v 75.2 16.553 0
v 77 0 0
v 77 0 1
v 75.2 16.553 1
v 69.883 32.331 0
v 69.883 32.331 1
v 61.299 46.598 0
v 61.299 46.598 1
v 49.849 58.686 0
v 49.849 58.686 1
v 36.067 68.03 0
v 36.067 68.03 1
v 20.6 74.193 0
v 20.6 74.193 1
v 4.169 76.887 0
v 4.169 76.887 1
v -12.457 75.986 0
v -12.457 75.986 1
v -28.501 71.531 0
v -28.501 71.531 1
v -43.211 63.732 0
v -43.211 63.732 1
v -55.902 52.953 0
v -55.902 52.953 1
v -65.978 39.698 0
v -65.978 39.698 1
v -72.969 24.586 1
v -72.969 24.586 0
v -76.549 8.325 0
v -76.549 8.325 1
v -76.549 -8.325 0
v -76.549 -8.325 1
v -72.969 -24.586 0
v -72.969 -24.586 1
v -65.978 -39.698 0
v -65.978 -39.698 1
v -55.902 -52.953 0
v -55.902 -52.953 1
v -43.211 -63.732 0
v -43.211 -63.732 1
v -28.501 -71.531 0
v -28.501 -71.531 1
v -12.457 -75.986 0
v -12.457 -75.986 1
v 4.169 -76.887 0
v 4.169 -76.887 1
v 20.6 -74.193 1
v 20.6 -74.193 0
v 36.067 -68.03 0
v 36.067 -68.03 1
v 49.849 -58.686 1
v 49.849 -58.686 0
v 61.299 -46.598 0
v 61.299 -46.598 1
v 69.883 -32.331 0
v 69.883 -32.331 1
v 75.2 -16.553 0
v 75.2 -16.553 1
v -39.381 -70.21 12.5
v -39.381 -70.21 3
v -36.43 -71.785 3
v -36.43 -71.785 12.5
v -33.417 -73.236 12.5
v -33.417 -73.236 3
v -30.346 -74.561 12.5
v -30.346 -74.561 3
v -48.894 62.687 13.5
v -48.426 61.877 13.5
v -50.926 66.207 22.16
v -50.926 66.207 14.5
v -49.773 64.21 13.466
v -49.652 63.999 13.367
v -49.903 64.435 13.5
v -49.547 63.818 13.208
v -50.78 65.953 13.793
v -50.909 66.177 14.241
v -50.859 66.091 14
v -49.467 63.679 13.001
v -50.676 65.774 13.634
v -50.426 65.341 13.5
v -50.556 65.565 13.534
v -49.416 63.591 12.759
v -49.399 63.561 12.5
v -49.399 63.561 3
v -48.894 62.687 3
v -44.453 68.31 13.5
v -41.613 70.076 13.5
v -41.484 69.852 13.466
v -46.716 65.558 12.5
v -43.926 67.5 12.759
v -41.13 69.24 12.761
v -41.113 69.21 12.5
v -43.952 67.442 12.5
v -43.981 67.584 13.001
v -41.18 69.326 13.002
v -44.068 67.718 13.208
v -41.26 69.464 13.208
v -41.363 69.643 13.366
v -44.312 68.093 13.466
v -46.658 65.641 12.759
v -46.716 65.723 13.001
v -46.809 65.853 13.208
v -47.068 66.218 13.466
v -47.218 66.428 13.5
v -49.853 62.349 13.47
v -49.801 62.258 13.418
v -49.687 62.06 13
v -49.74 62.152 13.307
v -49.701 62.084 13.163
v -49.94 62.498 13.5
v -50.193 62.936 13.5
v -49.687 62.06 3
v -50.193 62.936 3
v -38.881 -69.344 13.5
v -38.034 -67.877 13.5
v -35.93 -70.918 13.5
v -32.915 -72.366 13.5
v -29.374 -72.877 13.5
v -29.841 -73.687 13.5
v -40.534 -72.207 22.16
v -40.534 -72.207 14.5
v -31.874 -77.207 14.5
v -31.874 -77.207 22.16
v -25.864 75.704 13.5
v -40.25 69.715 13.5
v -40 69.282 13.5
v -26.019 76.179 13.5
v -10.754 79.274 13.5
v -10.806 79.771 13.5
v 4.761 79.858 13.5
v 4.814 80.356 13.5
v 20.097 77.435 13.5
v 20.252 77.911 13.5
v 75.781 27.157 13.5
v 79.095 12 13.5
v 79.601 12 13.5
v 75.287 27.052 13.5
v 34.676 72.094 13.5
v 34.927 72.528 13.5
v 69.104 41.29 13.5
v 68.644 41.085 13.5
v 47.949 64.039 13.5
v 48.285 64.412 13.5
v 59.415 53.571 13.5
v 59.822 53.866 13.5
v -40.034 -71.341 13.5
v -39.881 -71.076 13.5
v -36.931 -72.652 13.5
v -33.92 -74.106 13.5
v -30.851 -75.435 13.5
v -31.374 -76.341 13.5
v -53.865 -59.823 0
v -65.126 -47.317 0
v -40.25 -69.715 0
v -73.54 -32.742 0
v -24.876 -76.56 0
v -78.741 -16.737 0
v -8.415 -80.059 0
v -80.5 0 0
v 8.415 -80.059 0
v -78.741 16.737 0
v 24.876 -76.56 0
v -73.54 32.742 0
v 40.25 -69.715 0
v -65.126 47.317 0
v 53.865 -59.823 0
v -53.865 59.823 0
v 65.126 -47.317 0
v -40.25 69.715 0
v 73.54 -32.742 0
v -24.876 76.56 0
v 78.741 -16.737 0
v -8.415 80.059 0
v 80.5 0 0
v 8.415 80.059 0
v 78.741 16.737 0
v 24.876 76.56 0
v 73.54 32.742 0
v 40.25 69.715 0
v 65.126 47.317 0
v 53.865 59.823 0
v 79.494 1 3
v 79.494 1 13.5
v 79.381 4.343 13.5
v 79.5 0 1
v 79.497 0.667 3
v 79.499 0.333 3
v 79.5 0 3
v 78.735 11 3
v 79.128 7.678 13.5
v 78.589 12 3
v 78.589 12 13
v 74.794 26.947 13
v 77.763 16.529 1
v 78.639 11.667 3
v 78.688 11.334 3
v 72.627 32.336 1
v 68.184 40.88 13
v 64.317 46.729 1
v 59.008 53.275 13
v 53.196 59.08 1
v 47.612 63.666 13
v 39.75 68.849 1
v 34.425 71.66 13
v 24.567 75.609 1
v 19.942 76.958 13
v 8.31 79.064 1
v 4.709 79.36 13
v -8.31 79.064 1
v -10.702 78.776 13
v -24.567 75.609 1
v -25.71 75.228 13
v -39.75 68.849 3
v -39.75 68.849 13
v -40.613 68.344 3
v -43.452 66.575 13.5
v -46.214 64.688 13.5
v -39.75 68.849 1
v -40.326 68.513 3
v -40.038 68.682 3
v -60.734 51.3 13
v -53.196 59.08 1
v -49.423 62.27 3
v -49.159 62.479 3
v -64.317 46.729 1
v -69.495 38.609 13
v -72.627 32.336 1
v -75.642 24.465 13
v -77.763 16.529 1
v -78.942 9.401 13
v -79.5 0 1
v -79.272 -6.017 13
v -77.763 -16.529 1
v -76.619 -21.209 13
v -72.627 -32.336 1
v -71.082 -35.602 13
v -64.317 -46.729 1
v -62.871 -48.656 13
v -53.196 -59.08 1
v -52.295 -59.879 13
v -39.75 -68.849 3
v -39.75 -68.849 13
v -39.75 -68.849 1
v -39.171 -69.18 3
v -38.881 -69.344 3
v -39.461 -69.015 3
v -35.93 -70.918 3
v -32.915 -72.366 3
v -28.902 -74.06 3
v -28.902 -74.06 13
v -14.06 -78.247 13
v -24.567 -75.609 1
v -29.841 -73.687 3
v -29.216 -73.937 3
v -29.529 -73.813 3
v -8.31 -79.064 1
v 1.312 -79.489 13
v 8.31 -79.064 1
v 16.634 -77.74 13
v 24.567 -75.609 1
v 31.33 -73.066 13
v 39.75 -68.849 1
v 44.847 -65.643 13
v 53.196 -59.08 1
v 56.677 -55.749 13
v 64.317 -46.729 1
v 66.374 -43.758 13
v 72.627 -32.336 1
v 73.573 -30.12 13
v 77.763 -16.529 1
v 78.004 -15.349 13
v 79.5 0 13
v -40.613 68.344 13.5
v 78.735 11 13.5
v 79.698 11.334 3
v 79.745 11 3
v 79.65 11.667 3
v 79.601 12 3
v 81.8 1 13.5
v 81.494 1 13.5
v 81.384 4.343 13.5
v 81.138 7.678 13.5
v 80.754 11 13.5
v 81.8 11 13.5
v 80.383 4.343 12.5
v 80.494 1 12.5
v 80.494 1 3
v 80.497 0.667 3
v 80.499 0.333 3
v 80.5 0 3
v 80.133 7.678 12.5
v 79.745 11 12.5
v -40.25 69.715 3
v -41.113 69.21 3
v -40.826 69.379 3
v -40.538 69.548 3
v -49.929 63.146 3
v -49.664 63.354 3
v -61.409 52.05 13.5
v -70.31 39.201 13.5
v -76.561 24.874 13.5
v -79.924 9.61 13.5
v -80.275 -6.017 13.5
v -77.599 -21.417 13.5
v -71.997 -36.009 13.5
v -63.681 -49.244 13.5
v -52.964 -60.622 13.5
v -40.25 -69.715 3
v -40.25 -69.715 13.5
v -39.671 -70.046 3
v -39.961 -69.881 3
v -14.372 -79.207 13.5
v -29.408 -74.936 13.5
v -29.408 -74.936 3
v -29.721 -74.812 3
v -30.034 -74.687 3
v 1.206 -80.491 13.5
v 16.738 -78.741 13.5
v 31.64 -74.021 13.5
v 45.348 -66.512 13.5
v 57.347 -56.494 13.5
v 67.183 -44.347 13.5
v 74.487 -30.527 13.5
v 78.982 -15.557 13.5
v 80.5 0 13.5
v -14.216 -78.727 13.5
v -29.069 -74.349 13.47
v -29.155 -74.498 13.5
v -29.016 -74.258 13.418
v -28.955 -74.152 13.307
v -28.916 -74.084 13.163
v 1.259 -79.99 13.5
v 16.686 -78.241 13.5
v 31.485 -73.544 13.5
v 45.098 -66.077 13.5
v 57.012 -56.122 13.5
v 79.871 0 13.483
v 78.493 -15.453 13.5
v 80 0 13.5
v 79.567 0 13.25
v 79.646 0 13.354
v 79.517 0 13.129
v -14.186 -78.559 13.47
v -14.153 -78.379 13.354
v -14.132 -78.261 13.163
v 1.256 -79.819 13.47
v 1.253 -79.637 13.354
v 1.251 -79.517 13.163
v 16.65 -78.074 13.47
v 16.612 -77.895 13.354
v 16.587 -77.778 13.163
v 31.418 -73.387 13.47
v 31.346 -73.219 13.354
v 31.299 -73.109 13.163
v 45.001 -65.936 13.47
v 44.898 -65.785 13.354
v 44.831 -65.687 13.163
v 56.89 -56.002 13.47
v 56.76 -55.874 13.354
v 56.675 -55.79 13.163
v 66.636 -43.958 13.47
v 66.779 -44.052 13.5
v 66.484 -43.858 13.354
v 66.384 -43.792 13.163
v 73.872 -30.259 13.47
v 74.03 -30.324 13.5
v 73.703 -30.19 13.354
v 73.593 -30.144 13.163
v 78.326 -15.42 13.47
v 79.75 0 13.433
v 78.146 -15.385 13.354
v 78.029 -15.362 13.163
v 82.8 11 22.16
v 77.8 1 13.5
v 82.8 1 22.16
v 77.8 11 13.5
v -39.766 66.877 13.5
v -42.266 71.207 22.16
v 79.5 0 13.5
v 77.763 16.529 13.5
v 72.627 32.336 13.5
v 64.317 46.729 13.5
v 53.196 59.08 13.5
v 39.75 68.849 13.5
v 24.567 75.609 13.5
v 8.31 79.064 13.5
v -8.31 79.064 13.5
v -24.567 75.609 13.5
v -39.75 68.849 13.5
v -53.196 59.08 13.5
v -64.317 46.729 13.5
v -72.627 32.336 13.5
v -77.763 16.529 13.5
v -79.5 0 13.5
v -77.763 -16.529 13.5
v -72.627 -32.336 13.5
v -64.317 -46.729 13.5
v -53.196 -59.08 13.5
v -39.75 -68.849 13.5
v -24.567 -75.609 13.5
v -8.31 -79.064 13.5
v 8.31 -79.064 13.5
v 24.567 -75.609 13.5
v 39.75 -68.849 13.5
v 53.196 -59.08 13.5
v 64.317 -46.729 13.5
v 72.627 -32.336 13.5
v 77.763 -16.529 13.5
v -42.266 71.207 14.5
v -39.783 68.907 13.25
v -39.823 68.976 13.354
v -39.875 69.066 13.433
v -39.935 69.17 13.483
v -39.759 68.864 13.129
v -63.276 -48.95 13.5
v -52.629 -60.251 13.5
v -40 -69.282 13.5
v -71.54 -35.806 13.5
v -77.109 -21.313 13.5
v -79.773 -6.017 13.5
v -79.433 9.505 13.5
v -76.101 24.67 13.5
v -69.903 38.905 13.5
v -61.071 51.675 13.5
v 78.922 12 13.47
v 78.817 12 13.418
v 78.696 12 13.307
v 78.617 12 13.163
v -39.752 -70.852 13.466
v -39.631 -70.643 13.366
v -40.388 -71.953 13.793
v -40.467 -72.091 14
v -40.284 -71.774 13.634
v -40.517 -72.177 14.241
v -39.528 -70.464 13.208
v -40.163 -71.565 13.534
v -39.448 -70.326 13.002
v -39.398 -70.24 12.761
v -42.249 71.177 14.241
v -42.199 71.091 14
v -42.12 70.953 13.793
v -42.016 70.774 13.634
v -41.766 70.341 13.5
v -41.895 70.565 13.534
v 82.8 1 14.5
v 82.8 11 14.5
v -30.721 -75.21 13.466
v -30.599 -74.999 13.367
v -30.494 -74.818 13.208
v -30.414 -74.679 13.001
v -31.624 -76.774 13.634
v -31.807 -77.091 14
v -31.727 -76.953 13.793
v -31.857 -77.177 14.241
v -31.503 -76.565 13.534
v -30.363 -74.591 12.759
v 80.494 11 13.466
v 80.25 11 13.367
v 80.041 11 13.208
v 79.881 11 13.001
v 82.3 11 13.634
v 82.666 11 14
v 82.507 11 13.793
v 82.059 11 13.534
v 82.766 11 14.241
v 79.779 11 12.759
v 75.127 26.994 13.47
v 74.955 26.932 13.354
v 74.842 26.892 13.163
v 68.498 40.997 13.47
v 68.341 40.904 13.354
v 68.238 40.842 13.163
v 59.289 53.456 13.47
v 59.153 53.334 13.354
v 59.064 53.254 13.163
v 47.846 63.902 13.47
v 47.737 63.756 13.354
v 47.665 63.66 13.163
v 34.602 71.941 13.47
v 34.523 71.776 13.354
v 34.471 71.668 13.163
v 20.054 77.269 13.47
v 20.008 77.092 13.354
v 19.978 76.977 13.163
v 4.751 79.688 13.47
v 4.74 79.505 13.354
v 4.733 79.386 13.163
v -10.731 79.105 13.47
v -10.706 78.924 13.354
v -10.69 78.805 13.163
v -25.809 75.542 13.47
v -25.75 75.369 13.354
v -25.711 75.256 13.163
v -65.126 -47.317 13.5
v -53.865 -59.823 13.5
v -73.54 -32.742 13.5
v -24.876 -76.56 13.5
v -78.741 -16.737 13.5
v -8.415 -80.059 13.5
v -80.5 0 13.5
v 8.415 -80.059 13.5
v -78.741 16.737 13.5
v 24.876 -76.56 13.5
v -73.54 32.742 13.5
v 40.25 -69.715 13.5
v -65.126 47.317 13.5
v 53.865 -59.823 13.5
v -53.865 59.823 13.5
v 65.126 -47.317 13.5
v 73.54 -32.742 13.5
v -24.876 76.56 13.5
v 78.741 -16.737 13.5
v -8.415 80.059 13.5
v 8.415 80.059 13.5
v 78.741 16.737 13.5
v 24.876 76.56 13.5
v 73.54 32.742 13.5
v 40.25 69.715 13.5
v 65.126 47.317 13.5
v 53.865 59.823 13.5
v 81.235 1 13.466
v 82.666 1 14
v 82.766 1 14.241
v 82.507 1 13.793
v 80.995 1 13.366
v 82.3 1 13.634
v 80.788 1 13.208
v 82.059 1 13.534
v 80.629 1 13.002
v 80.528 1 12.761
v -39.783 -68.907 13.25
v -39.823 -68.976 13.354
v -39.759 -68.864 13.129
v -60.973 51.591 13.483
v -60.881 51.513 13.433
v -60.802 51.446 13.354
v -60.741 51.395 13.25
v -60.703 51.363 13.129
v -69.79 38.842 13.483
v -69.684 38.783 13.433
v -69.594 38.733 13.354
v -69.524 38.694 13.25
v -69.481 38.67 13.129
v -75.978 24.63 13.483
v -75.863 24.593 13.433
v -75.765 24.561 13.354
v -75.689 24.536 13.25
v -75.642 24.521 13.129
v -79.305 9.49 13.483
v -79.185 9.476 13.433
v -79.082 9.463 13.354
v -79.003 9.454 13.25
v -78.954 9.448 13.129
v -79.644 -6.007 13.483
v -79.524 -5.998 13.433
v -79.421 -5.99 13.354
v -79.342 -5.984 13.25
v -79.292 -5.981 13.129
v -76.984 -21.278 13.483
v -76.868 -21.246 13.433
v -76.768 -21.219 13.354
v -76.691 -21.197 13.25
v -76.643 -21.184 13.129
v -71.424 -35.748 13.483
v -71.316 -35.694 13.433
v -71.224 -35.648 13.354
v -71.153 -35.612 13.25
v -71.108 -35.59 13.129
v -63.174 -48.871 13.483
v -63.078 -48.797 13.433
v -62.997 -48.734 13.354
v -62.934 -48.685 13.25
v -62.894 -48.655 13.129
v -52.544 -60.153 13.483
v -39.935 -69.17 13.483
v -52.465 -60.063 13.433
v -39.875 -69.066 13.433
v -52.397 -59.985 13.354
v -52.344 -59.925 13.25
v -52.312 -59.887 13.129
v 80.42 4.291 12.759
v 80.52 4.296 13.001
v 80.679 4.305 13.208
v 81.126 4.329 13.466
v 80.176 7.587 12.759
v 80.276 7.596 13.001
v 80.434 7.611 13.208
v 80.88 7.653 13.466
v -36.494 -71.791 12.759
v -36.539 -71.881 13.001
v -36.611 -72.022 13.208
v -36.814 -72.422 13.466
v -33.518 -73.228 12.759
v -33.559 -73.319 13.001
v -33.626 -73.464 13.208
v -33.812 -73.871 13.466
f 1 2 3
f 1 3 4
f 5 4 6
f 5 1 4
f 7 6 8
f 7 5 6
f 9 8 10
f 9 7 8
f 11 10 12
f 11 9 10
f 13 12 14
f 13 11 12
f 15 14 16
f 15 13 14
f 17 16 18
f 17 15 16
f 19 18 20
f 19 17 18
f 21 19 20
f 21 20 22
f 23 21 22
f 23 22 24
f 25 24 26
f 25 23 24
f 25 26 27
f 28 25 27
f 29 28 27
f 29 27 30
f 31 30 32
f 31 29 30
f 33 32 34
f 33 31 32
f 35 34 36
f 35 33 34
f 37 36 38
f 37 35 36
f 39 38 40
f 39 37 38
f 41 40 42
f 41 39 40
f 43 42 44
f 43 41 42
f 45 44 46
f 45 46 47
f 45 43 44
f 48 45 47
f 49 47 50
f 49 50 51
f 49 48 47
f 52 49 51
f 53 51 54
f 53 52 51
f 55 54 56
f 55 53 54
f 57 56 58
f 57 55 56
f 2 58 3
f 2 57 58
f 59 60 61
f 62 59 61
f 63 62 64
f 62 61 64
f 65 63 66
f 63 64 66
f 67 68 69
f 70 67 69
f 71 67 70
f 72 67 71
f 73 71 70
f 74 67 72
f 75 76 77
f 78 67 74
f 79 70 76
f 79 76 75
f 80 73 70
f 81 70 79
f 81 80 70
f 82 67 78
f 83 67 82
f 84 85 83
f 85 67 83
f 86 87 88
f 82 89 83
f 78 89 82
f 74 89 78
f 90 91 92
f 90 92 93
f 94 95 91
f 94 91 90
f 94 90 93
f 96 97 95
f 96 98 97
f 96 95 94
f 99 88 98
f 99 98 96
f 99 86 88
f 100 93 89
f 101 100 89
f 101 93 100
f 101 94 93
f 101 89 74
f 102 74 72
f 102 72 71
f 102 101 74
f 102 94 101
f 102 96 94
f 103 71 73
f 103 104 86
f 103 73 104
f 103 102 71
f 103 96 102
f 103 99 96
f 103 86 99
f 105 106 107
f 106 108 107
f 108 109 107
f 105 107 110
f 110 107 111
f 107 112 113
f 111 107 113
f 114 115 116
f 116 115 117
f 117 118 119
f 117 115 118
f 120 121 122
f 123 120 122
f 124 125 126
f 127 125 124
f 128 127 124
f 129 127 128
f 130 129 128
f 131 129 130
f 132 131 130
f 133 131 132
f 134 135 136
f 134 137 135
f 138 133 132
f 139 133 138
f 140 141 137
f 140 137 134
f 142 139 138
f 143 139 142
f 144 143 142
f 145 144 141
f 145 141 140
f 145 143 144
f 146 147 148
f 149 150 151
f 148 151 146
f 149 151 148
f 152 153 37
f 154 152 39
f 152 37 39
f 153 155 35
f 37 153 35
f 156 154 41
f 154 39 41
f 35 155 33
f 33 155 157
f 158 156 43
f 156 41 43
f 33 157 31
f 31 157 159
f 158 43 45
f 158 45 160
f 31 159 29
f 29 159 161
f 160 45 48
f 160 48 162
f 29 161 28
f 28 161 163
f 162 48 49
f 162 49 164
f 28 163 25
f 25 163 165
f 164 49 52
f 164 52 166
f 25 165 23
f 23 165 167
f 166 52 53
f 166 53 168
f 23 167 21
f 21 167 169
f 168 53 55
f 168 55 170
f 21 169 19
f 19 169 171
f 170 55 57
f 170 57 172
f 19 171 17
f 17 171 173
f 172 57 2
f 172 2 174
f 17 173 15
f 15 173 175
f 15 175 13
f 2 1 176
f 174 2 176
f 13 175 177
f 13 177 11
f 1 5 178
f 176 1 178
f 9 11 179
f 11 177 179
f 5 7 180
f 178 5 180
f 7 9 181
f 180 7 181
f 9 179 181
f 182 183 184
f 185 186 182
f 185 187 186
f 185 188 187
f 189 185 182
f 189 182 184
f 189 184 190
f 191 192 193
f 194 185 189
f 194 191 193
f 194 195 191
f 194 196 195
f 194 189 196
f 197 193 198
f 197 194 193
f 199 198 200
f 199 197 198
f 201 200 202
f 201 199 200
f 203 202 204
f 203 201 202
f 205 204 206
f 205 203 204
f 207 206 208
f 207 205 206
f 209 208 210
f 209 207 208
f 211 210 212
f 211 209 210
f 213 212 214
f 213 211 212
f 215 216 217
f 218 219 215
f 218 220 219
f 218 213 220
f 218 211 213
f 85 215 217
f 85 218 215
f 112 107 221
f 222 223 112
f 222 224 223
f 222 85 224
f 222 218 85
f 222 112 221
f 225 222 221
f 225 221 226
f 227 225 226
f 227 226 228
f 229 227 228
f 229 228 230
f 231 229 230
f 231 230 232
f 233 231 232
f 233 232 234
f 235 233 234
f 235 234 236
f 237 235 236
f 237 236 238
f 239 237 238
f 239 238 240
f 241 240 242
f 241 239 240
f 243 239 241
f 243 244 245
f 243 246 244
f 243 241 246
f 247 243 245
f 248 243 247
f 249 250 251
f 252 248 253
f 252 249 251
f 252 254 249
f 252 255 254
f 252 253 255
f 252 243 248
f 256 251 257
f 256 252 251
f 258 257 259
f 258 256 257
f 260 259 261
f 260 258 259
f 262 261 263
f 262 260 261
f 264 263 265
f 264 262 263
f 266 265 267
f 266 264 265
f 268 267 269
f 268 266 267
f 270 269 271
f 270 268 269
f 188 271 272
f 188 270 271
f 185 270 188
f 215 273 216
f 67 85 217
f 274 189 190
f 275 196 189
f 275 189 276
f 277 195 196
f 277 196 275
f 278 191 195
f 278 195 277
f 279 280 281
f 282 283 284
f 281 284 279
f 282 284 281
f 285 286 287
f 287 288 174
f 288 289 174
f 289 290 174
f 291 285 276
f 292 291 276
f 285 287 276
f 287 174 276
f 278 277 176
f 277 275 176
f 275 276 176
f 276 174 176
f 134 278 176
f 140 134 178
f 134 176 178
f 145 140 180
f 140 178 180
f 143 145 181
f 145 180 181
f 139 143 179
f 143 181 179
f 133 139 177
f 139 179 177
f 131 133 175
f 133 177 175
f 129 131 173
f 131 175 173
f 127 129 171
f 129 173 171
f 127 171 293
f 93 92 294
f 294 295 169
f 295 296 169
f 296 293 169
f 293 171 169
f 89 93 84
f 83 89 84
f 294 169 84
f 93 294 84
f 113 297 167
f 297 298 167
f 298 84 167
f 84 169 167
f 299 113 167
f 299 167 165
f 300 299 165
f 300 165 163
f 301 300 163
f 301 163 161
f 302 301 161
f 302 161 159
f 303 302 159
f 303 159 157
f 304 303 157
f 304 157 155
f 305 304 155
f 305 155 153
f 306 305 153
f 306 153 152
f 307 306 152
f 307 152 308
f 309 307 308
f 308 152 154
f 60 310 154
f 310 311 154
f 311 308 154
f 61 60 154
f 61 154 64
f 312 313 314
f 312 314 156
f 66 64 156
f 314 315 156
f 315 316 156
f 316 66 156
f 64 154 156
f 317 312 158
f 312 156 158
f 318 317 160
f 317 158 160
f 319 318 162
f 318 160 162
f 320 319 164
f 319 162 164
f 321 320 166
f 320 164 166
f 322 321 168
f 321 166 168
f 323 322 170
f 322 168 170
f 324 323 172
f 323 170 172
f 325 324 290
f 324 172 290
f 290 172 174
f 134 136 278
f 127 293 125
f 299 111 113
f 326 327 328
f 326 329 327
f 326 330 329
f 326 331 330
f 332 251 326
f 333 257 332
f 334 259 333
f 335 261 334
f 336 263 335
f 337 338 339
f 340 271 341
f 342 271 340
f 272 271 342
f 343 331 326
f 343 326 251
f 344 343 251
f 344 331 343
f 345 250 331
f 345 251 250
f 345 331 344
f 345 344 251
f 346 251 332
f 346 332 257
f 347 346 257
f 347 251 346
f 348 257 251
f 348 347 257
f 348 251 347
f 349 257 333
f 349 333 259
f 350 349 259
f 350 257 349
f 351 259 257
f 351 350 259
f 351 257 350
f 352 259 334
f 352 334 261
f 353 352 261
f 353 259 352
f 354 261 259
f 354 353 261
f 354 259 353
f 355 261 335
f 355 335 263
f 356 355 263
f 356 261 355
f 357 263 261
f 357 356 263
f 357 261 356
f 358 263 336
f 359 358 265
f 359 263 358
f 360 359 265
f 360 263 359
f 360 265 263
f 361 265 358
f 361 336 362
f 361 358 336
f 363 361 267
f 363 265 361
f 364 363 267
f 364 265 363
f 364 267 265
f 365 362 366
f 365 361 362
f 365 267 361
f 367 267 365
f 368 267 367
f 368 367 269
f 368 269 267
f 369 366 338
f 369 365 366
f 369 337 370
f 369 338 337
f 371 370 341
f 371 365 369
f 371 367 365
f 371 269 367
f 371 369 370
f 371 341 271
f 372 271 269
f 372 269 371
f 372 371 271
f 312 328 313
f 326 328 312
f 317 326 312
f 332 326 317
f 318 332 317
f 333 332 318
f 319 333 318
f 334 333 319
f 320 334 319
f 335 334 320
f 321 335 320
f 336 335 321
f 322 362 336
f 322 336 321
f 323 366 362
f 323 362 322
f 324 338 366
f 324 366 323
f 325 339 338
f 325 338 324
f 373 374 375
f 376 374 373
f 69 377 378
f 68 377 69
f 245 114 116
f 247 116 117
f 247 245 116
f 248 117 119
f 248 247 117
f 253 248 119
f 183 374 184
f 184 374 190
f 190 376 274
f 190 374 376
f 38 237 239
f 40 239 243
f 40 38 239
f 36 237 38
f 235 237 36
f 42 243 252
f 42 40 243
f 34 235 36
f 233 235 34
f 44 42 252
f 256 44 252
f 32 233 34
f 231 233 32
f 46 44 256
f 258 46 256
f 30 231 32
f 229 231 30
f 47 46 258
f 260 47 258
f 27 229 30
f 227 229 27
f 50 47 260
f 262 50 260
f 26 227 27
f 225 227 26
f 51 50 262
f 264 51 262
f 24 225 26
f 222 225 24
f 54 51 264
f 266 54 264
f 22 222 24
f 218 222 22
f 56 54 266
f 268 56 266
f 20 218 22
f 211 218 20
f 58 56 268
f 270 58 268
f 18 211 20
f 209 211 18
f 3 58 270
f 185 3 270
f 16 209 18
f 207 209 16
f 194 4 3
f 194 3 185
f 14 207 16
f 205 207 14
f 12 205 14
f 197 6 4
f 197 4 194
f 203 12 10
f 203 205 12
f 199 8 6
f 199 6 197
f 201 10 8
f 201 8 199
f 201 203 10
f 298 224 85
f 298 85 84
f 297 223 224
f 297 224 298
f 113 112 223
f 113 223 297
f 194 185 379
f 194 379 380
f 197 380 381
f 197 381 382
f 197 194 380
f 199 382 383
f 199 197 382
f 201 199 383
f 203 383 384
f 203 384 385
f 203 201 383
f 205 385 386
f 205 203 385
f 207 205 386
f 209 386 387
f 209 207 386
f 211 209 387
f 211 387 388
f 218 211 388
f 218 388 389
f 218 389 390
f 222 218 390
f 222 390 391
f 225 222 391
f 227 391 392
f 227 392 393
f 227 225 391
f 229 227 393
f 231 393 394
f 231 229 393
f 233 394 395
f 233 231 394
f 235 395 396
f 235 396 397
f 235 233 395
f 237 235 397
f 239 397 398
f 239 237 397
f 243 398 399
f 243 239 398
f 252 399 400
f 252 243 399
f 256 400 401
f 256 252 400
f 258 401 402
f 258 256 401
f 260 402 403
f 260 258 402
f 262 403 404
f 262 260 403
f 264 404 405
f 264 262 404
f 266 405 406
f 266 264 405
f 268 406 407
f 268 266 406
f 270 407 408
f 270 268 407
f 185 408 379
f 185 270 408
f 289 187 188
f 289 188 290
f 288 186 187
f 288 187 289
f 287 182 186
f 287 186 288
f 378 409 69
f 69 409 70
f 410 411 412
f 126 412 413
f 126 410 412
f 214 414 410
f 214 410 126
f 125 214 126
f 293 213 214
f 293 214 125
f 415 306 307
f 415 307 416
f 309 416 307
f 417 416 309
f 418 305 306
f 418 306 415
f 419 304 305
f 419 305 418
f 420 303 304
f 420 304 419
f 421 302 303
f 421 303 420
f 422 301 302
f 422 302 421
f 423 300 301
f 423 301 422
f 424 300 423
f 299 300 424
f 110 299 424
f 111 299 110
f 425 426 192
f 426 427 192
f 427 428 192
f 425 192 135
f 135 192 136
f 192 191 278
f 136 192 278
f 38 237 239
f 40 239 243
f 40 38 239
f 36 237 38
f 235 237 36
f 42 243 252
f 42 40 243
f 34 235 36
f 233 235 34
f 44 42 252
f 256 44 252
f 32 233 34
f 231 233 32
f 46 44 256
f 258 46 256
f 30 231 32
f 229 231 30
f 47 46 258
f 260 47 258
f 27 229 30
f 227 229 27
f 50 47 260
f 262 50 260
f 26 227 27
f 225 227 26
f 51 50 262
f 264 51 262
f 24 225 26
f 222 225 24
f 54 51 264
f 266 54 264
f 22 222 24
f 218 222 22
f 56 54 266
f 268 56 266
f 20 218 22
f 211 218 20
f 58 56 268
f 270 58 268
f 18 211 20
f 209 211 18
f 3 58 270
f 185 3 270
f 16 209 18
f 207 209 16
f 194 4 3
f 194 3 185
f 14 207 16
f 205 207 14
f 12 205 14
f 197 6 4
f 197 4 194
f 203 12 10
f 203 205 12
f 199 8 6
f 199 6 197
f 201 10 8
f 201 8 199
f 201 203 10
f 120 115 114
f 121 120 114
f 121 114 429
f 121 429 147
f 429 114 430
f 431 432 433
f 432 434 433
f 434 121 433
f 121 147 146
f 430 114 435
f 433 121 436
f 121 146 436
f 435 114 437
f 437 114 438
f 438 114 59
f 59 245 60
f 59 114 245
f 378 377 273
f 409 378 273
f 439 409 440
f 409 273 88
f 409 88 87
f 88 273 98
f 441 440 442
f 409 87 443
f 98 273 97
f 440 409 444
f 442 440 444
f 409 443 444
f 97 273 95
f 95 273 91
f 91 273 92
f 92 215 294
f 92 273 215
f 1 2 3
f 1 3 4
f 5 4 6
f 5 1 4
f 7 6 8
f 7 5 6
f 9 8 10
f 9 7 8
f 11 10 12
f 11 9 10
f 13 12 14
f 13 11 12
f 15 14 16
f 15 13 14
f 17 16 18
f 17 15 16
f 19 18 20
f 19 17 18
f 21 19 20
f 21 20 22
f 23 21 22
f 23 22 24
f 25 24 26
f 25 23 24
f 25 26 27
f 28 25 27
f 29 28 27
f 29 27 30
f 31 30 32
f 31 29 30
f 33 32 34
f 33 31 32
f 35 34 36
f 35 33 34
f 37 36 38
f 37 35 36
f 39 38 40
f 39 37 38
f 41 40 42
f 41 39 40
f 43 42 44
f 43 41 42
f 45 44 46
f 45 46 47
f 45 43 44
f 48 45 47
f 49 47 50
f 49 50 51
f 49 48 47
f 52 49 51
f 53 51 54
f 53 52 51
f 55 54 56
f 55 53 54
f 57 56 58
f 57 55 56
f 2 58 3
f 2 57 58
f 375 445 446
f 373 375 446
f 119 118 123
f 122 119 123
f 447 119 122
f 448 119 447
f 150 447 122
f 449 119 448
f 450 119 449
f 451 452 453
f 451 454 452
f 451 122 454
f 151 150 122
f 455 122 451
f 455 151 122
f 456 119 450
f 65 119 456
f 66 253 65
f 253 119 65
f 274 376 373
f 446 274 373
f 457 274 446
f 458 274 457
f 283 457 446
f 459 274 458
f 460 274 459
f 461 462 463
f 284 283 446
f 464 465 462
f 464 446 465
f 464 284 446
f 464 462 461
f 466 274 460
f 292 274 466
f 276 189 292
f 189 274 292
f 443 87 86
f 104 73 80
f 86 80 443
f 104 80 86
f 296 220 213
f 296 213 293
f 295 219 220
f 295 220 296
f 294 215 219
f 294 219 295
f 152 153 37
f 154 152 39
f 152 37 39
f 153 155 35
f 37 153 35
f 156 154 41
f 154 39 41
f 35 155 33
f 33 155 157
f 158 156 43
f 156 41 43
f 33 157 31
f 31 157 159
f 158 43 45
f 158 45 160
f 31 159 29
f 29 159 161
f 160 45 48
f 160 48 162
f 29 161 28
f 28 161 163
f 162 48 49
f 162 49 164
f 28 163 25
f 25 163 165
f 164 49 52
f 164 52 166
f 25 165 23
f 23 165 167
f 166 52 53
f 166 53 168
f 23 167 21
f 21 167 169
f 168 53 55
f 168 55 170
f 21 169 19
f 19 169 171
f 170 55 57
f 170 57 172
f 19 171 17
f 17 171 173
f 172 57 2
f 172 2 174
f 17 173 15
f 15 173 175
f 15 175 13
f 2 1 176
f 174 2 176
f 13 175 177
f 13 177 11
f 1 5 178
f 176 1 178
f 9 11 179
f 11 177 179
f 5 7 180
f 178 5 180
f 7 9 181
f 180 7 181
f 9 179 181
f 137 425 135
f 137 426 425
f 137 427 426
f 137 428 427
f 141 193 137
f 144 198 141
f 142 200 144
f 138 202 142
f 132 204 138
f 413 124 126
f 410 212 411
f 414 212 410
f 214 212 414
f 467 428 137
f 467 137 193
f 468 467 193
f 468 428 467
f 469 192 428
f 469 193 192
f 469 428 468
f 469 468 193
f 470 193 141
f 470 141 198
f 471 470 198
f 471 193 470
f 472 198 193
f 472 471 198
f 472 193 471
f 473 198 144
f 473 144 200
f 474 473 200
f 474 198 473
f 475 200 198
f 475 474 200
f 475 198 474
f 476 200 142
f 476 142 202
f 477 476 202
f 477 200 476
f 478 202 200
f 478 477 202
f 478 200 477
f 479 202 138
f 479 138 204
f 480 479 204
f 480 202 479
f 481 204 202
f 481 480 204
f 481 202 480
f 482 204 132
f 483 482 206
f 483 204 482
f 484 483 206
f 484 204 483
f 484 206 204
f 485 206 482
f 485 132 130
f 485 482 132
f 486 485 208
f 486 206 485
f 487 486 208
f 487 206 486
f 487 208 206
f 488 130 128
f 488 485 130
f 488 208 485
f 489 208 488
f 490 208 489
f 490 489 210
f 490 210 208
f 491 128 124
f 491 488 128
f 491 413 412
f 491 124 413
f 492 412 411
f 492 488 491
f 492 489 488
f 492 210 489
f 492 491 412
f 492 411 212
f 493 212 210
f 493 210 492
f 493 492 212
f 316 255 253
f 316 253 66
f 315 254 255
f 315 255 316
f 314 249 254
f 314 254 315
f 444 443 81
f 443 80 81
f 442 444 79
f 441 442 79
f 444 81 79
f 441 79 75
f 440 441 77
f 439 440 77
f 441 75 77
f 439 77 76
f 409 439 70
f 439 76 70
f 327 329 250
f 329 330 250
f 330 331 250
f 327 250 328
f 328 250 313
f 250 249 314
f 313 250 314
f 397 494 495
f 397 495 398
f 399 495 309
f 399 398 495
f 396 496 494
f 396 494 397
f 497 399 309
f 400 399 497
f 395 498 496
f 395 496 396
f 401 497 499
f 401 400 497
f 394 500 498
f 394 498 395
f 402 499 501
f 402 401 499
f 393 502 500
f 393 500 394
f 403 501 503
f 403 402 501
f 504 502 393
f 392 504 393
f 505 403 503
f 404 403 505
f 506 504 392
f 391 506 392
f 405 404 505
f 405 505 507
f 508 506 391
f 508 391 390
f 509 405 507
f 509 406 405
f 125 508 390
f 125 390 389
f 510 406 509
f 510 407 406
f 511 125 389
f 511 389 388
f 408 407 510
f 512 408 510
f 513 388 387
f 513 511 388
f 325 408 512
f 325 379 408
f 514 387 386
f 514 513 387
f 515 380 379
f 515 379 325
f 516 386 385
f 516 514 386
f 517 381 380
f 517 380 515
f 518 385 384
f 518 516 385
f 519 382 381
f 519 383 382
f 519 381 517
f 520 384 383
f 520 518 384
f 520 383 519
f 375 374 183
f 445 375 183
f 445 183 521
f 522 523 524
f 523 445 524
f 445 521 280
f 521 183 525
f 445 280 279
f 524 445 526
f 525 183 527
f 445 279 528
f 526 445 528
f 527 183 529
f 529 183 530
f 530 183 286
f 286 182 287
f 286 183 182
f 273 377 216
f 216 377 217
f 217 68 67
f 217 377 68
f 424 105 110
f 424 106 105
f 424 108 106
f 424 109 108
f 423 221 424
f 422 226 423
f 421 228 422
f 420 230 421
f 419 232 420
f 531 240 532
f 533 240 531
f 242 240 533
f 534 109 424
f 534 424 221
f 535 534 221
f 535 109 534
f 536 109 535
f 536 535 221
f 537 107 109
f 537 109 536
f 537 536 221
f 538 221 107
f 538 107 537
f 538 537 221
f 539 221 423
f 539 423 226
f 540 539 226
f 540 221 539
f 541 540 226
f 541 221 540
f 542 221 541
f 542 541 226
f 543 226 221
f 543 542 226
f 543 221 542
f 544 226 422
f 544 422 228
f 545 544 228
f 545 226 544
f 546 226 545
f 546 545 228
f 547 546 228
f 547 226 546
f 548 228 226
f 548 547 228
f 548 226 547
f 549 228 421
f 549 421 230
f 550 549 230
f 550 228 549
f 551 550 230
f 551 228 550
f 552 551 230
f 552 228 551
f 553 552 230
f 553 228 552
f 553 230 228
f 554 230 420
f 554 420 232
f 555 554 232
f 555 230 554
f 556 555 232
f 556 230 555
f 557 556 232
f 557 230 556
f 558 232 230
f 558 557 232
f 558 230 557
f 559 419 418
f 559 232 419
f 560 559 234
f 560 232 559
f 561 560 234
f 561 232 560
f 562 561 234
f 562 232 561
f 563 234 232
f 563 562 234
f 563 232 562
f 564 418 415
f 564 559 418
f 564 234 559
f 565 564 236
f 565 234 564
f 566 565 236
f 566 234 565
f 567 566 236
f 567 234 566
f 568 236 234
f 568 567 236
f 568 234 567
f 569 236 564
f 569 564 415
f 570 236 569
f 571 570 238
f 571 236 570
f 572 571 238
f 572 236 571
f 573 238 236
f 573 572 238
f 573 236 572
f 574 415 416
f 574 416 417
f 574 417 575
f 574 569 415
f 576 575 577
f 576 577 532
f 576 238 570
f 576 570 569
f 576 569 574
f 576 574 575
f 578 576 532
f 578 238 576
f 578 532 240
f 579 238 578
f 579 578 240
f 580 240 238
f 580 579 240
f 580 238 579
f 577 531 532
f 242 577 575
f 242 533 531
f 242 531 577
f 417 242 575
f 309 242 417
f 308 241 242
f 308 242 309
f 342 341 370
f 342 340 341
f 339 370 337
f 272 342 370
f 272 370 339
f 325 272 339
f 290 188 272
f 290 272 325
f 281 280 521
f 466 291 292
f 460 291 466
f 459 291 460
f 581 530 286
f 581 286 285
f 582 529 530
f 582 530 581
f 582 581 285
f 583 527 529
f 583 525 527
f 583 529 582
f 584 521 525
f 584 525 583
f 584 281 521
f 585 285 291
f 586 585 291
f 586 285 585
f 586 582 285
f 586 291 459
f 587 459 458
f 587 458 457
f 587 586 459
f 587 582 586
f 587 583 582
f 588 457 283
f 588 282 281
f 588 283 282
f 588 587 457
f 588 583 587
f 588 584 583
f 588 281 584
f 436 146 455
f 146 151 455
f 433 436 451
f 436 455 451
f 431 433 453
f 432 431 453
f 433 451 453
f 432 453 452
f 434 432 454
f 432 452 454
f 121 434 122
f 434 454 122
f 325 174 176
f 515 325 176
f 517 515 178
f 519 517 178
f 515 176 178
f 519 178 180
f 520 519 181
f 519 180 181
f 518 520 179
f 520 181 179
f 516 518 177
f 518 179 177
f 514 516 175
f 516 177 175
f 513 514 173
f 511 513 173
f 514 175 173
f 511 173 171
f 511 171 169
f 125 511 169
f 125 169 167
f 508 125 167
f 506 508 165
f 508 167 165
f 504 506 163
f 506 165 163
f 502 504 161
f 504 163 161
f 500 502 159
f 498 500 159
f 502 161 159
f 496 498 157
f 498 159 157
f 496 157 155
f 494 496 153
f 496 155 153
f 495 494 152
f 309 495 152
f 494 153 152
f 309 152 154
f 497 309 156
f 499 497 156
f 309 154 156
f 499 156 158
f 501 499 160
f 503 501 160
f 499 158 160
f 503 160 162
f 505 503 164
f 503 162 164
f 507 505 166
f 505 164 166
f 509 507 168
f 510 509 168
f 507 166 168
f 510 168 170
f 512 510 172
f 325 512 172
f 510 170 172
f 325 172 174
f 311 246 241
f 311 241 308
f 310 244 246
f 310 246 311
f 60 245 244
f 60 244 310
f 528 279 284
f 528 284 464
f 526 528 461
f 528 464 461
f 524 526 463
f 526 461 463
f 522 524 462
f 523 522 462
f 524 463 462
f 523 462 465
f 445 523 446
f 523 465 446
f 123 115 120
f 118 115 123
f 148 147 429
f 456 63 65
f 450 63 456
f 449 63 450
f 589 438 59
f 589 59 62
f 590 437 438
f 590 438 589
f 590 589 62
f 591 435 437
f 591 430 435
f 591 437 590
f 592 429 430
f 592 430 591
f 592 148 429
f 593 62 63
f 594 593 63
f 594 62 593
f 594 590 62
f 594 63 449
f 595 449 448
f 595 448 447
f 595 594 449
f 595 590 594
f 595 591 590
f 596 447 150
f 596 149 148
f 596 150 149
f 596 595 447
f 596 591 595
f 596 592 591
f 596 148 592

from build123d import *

# Parameters (mm, degrees)
CYLINDER_R             = 77
CYLINDER_DEPTH         = 1
CYLINDER001_R          = 79.5
CYLINDER001_DEPTH      = 12.5
CYLINDER002_R          = 80.5
CYLINDER002_DEPTH      = 13.5
BOX002_W               = 5
BOX002_H               = 10
BOX002_DEPTH           = 12
BOX003_W               = 5
BOX003_H               = 10
BOX003_DEPTH           = 12
BOX003_PLACEMENT_ANGLE = 30
CYLINDER003_R          = 79.5
CYLINDER003_DEPTH      = 13.5
CYLINDER004_R          = 80.5
CYLINDER004_DEPTH      = 13.5
BOX001_W               = 5
BOX001_H               = 10
BOX001_DEPTH           = 12
ARRAY001_COUNT         = 3
BOX_W                  = 5
BOX_H                  = 12
BOX_DEPTH              = 12
ARRAY_COUNT            = 3
CYLINDER005_R          = 77
CYLINDER005_DEPTH      = 1
CYLINDER006_R          = 79.5
CYLINDER006_DEPTH      = 12.5
CYLINDER007_R          = 80.5
CYLINDER007_DEPTH      = 13.5
FILLET_R               = 0.5
FILLET001_R            = 1


with BuildPart() as cylinder:
    # Cylinder → Cylinder (new body)
    with BuildSketch(Plane.XY):
        Circle(CYLINDER_R)
    extrude(amount=CYLINDER_DEPTH)


with BuildPart() as fusion:
    # Cylinder001 → Cylinder001 (new body)
    with BuildSketch(Plane.XY.offset(1)):
        Circle(CYLINDER001_R)
    extrude(amount=CYLINDER001_DEPTH)

    # Fusion: union Cylinder
    add(cylinder.part)


with BuildPart() as attachmentseatrecess_noclamps:
    # Cylinder002 → Cylinder002 (new body)
    with BuildSketch(Plane.XY):
        Circle(CYLINDER002_R)
    extrude(amount=CYLINDER002_DEPTH)

    # Cut: cut Fusion
    add(fusion.part, mode=Mode.SUBTRACT)


with BuildPart() as cube002:
    # Box002 → Box002 (new body)
    with BuildSketch(Plane(origin=(77.8, 1, 13.5), x_dir=(1, 0, 0), z_dir=(0, 0, 1))):
        with Locations((2.5, 5)):
            Rectangle(BOX002_W, BOX002_H)
    extrude(amount=BOX002_DEPTH)


with BuildPart() as common001:
    # Box003 → Box003 (new body)
    with BuildSketch(Plane.XY):
        with Locations((2.5, 5)):
            Rectangle(BOX003_W, BOX003_H)
    extrude(amount=BOX003_DEPTH)


with BuildPart() as common001_1:
    # Box003 placement: moved
    add(common001.part.moved(Location((77.8, 1, 13.5))).rotate(Axis((77.8, 1, 13.5), (0, 1, 0)), BOX003_PLACEMENT_ANGLE))

    # Common001: intersect Cube002
    add(cube002.part, mode=Mode.INTERSECT)


with BuildPart() as cylinder003:
    # Cylinder003 → Cylinder003 (new body)
    with BuildSketch(Plane.XY):
        Circle(CYLINDER003_R)
    extrude(amount=CYLINDER003_DEPTH)


with BuildPart() as cut001:
    # Cylinder004 → Cylinder004 (new body)
    with BuildSketch(Plane.XY):
        Circle(CYLINDER004_R)
    extrude(amount=CYLINDER004_DEPTH)

    # Cut001: cut Cylinder003
    add(cylinder003.part, mode=Mode.SUBTRACT)


with BuildPart() as array001:
    # Box001 → Box001 (new body)
    with BuildSketch(Plane(origin=(77.8, 1, 3), x_dir=(1, 0, 0), z_dir=(0, 0, 1))):
        with Locations((2.5, 5)):
            Rectangle(BOX001_W, BOX001_H)
    extrude(amount=BOX001_DEPTH)

    # Common: intersect Cut001
    add(cut001.part, mode=Mode.INTERSECT)

    # Fusion001: union Common001
    add(common001_1.part)

    # Array001: Array001 ×3 about axis
    array001_axis = Axis((0, 0, 0), (0, 0, 1))


with BuildPart() as array001_1:
    add(array001.part)
    for i in range(1, ARRAY001_COUNT):
        add(array001.part.rotate(array001_axis, i * 360 / ARRAY001_COUNT))


with BuildPart() as array:
    # Box → Box (new body)
    with BuildSketch(Plane(origin=(77, 0, 3), x_dir=(1, 0, 0), z_dir=(0, 0, 1))):
        with Locations((2.5, 6)):
            Rectangle(BOX_W, BOX_H)
    extrude(amount=BOX_DEPTH)

    # Array: Array ×3 about axis
    array_axis = Axis((0, 0, 0), (0, 0, 1))


with BuildPart() as array_1:
    add(array.part)
    for i in range(1, ARRAY_COUNT):
        add(array.part.rotate(array_axis, i * 360 / ARRAY_COUNT))


with BuildPart() as cylinder005:
    # Cylinder005 → Cylinder005 (new body)
    with BuildSketch(Plane.XY):
        Circle(CYLINDER005_R)
    extrude(amount=CYLINDER005_DEPTH)


with BuildPart() as fusion002:
    # Cylinder006 → Cylinder006 (new body)
    with BuildSketch(Plane.XY.offset(1)):
        Circle(CYLINDER006_R)
    extrude(amount=CYLINDER006_DEPTH)

    # Fusion002: union Cylinder005
    add(cylinder005.part)


with BuildPart() as fillet001:
    # Cylinder007 → Cylinder007 (new body)
    with BuildSketch(Plane.XY):
        Circle(CYLINDER007_R)
    extrude(amount=CYLINDER007_DEPTH)

    # Cut002: cut Fusion002
    add(fusion002.part, mode=Mode.SUBTRACT)

    # Cut003: cut Array
    add(array_1.part, mode=Mode.SUBTRACT)

    # Fusion003: union Array001
    add(array001_1.part)

    # Fillet
    fillet_edges = [fillet001.edges().sort_by_distance(p)[0] for p in [
        (44.847077, -65.642895, 13.5),
        (-79.271953, -6.017261, 13.5),
        (34.424876, 71.660156, 13.5),
    ]]
    fillet(fillet_edges, radius=FILLET_R)

    # Fillet001
    fillet001_edges = [fillet001.edges().sort_by_distance(p)[0] for p in [
        (-34.931345, -72.52621, 13.5),
        (-45.343868, 66.514537, 13.5),
        (80.275213, 6.011673, 13.5),
        (-36.203848, -74.706903, 13.5),
        (-46.596152, 68.706903, 13.5),
        (82.8, 6, 13.5),
    ]]
    fillet(fillet001_edges, radius=FILLET001_R)


solid = Compound([attachmentseatrecess_noclamps.part, fillet001.part])
